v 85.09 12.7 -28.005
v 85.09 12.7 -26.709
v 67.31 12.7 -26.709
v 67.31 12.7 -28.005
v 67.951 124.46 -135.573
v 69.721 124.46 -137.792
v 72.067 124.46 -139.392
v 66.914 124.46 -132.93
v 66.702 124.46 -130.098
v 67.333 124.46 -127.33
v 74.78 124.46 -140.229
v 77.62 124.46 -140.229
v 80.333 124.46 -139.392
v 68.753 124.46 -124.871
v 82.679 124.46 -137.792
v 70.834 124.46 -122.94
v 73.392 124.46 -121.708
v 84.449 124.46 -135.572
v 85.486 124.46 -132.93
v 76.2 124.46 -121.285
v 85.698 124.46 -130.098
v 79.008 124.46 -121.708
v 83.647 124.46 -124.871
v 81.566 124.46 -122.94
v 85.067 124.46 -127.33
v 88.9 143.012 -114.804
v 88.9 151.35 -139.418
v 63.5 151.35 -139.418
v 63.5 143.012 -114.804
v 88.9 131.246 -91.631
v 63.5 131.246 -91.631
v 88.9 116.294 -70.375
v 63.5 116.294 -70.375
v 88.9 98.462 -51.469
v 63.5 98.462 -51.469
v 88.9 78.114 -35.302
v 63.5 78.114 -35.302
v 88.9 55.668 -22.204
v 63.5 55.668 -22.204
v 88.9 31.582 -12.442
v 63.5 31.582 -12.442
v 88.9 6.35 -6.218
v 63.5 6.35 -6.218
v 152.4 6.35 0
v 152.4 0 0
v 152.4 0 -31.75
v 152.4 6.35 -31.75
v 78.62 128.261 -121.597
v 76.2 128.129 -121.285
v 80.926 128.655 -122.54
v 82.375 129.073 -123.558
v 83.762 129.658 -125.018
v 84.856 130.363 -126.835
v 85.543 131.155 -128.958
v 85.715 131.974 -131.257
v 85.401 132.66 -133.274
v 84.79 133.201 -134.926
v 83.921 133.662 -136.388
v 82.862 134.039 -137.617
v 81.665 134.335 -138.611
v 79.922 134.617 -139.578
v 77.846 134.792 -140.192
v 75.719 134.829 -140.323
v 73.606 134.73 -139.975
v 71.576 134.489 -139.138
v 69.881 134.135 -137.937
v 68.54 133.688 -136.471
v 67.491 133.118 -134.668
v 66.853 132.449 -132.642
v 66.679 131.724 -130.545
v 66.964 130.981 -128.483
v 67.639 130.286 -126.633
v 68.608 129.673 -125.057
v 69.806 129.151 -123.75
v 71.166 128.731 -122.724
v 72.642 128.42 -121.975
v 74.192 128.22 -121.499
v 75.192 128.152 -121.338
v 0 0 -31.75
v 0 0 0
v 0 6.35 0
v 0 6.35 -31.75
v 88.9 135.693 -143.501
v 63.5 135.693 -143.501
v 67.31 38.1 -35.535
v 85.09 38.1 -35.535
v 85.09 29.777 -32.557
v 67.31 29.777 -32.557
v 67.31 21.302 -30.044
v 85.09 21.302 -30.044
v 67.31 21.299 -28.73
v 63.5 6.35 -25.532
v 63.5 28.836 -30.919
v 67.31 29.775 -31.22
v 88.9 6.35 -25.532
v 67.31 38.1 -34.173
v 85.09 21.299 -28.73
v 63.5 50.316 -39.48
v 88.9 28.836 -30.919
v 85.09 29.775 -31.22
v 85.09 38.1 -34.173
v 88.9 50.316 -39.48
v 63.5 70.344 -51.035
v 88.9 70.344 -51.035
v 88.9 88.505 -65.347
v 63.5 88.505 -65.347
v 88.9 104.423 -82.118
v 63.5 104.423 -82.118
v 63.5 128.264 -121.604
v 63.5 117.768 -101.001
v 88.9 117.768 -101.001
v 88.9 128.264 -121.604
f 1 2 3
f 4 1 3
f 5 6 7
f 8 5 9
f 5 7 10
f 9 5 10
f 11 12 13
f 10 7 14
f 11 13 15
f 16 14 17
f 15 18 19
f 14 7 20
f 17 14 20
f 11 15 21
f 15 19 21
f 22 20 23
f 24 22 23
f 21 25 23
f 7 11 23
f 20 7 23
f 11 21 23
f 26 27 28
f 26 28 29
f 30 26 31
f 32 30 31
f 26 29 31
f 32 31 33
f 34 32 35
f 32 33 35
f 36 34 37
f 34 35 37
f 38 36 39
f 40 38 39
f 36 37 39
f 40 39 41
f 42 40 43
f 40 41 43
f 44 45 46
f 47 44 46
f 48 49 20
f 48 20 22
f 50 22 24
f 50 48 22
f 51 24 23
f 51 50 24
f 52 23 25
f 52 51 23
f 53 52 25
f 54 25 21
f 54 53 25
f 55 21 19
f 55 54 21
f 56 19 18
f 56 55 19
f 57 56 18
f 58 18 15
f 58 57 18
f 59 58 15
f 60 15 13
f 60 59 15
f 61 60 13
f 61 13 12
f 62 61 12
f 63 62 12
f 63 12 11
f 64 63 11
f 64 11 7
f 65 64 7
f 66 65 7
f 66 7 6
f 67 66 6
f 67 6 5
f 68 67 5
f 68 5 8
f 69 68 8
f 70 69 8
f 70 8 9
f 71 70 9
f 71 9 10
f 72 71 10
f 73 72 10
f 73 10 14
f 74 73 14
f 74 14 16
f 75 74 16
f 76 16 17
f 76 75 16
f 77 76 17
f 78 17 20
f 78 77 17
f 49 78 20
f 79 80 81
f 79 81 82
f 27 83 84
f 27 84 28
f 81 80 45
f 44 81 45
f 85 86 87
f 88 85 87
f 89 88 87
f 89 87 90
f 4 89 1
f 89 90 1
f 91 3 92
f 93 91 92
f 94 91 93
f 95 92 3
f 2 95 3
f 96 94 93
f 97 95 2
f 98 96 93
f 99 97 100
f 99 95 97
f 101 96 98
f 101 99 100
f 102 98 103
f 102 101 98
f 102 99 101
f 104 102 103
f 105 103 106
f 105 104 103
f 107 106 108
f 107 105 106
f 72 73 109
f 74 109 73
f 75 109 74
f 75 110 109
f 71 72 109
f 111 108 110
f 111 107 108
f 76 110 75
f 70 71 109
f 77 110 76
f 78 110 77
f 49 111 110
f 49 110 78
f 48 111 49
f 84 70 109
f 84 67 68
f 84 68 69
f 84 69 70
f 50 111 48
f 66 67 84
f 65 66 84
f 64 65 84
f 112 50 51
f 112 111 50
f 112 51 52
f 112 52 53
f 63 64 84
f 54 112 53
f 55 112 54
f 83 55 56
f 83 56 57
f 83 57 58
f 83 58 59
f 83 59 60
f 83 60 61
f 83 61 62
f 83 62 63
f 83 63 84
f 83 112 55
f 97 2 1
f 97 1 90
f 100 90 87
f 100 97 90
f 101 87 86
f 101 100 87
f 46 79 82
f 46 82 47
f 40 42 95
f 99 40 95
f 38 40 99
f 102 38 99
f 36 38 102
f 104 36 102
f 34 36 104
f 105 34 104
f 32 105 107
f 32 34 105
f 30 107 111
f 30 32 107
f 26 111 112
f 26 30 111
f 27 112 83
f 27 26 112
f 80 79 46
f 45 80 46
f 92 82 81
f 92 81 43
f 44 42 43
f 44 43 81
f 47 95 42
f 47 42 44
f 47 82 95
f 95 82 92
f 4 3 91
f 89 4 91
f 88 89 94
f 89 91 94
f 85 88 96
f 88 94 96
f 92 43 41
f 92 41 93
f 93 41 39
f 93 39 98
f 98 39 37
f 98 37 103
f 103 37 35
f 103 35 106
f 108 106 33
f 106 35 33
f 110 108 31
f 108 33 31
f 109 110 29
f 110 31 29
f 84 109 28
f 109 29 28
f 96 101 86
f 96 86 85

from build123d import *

# Parameters (mm, degrees)
SKETCH1_W                = 152.4
SKETCH1_H                = 31.75
BOSS_EXTRUDE1_DEPTH      = 6.35
BOSS_EXTRUDE2_DEPTH      = 12.7
BOSS_EXTRUDE2_DEPTH_BACK = 12.7
SKETCH7_R                = 9.525
BOSS_EXTRUDE4_DEPTH      = 12.7
BOSS_EXTRUDE5_REACH      = 250.235
BOSS_EXTRUDE5_END_RADIUS = 159.352919158
SKETCH8_W                = 17.78
SKETCH8_H                = 25.4


with BuildPart() as part:
    # Sketch1 → Boss-Extrude1 (new body)
    with BuildSketch(Plane(origin=(0, 0, 0), x_dir=(1, 0, 0), z_dir=(0, 1, 0))):
        with Locations((76.2, 15.875)):
            Rectangle(SKETCH1_W, SKETCH1_H)
    extrude(amount=BOSS_EXTRUDE1_DEPTH)

    # Sketch5 → Boss-Extrude2 (add, two sides)
    with BuildSketch(Plane(origin=(76.2, 0, 0), x_dir=(0, 0, -1), z_dir=(1, 0, 0))) as boss_extrude2_sk:
        with BuildLine():
            Line((6.218121971, 6.35), (25.531878029, 6.35))
            ThreePointArc((25.531878029, 6.35), (65.347005213, 88.504842335), (143.500563524, 135.69259281))
            Line((143.500563524, 135.69259281), (139.418467432, 151.35))
            ThreePointArc((139.418467432, 151.35), (51.469243862, 98.46173067), (6.218121971, 6.35))
        make_face()
    extrude(amount=BOSS_EXTRUDE2_DEPTH)
    extrude(boss_extrude2_sk.sketch, amount=-BOSS_EXTRUDE2_DEPTH_BACK)

    # Sketch7 → Boss-Extrude4 (add)
    with BuildSketch(Plane(origin=(0, 137.16, 0), x_dir=(1, 0, 0), z_dir=(0, 1, 0))):
        with Locations(Location((76.2, 130.81, 0), (0, 0, 270))):
            Circle(SKETCH7_R)
    extrude(amount=-BOSS_EXTRUDE4_DEPTH)

    # Boss-Extrude5: up to this cylinder (the profile starts outside it)
    boss_extrude5_end = Plane(origin=(76.2, -19.734844364, -184.022581395), z_dir=(1, 0, 0)) * Cylinder(BOSS_EXTRUDE5_END_RADIUS, 820.175838317, mode=Mode.PRIVATE)
    # Sketch8 → Boss-Extrude5 (add, up to the surface)
    with BuildSketch(Plane(origin=(0, 0, -19.05), x_dir=(-1, 0, 0), z_dir=(0, 0, -1)), mode=Mode.PRIVATE) as boss_extrude5_sk1:
        with Locations((-76.2, 25.4)):
            Rectangle(SKETCH8_W, SKETCH8_H)
    boss_extrude5_tool1 = extrude(boss_extrude5_sk1.sketch, amount=BOSS_EXTRUDE5_REACH, mode=Mode.PRIVATE) - boss_extrude5_end
    add(boss_extrude5_tool1.solids().sort_by_distance((76.2, 25.4, -19.05))[0])


solid = part.part
